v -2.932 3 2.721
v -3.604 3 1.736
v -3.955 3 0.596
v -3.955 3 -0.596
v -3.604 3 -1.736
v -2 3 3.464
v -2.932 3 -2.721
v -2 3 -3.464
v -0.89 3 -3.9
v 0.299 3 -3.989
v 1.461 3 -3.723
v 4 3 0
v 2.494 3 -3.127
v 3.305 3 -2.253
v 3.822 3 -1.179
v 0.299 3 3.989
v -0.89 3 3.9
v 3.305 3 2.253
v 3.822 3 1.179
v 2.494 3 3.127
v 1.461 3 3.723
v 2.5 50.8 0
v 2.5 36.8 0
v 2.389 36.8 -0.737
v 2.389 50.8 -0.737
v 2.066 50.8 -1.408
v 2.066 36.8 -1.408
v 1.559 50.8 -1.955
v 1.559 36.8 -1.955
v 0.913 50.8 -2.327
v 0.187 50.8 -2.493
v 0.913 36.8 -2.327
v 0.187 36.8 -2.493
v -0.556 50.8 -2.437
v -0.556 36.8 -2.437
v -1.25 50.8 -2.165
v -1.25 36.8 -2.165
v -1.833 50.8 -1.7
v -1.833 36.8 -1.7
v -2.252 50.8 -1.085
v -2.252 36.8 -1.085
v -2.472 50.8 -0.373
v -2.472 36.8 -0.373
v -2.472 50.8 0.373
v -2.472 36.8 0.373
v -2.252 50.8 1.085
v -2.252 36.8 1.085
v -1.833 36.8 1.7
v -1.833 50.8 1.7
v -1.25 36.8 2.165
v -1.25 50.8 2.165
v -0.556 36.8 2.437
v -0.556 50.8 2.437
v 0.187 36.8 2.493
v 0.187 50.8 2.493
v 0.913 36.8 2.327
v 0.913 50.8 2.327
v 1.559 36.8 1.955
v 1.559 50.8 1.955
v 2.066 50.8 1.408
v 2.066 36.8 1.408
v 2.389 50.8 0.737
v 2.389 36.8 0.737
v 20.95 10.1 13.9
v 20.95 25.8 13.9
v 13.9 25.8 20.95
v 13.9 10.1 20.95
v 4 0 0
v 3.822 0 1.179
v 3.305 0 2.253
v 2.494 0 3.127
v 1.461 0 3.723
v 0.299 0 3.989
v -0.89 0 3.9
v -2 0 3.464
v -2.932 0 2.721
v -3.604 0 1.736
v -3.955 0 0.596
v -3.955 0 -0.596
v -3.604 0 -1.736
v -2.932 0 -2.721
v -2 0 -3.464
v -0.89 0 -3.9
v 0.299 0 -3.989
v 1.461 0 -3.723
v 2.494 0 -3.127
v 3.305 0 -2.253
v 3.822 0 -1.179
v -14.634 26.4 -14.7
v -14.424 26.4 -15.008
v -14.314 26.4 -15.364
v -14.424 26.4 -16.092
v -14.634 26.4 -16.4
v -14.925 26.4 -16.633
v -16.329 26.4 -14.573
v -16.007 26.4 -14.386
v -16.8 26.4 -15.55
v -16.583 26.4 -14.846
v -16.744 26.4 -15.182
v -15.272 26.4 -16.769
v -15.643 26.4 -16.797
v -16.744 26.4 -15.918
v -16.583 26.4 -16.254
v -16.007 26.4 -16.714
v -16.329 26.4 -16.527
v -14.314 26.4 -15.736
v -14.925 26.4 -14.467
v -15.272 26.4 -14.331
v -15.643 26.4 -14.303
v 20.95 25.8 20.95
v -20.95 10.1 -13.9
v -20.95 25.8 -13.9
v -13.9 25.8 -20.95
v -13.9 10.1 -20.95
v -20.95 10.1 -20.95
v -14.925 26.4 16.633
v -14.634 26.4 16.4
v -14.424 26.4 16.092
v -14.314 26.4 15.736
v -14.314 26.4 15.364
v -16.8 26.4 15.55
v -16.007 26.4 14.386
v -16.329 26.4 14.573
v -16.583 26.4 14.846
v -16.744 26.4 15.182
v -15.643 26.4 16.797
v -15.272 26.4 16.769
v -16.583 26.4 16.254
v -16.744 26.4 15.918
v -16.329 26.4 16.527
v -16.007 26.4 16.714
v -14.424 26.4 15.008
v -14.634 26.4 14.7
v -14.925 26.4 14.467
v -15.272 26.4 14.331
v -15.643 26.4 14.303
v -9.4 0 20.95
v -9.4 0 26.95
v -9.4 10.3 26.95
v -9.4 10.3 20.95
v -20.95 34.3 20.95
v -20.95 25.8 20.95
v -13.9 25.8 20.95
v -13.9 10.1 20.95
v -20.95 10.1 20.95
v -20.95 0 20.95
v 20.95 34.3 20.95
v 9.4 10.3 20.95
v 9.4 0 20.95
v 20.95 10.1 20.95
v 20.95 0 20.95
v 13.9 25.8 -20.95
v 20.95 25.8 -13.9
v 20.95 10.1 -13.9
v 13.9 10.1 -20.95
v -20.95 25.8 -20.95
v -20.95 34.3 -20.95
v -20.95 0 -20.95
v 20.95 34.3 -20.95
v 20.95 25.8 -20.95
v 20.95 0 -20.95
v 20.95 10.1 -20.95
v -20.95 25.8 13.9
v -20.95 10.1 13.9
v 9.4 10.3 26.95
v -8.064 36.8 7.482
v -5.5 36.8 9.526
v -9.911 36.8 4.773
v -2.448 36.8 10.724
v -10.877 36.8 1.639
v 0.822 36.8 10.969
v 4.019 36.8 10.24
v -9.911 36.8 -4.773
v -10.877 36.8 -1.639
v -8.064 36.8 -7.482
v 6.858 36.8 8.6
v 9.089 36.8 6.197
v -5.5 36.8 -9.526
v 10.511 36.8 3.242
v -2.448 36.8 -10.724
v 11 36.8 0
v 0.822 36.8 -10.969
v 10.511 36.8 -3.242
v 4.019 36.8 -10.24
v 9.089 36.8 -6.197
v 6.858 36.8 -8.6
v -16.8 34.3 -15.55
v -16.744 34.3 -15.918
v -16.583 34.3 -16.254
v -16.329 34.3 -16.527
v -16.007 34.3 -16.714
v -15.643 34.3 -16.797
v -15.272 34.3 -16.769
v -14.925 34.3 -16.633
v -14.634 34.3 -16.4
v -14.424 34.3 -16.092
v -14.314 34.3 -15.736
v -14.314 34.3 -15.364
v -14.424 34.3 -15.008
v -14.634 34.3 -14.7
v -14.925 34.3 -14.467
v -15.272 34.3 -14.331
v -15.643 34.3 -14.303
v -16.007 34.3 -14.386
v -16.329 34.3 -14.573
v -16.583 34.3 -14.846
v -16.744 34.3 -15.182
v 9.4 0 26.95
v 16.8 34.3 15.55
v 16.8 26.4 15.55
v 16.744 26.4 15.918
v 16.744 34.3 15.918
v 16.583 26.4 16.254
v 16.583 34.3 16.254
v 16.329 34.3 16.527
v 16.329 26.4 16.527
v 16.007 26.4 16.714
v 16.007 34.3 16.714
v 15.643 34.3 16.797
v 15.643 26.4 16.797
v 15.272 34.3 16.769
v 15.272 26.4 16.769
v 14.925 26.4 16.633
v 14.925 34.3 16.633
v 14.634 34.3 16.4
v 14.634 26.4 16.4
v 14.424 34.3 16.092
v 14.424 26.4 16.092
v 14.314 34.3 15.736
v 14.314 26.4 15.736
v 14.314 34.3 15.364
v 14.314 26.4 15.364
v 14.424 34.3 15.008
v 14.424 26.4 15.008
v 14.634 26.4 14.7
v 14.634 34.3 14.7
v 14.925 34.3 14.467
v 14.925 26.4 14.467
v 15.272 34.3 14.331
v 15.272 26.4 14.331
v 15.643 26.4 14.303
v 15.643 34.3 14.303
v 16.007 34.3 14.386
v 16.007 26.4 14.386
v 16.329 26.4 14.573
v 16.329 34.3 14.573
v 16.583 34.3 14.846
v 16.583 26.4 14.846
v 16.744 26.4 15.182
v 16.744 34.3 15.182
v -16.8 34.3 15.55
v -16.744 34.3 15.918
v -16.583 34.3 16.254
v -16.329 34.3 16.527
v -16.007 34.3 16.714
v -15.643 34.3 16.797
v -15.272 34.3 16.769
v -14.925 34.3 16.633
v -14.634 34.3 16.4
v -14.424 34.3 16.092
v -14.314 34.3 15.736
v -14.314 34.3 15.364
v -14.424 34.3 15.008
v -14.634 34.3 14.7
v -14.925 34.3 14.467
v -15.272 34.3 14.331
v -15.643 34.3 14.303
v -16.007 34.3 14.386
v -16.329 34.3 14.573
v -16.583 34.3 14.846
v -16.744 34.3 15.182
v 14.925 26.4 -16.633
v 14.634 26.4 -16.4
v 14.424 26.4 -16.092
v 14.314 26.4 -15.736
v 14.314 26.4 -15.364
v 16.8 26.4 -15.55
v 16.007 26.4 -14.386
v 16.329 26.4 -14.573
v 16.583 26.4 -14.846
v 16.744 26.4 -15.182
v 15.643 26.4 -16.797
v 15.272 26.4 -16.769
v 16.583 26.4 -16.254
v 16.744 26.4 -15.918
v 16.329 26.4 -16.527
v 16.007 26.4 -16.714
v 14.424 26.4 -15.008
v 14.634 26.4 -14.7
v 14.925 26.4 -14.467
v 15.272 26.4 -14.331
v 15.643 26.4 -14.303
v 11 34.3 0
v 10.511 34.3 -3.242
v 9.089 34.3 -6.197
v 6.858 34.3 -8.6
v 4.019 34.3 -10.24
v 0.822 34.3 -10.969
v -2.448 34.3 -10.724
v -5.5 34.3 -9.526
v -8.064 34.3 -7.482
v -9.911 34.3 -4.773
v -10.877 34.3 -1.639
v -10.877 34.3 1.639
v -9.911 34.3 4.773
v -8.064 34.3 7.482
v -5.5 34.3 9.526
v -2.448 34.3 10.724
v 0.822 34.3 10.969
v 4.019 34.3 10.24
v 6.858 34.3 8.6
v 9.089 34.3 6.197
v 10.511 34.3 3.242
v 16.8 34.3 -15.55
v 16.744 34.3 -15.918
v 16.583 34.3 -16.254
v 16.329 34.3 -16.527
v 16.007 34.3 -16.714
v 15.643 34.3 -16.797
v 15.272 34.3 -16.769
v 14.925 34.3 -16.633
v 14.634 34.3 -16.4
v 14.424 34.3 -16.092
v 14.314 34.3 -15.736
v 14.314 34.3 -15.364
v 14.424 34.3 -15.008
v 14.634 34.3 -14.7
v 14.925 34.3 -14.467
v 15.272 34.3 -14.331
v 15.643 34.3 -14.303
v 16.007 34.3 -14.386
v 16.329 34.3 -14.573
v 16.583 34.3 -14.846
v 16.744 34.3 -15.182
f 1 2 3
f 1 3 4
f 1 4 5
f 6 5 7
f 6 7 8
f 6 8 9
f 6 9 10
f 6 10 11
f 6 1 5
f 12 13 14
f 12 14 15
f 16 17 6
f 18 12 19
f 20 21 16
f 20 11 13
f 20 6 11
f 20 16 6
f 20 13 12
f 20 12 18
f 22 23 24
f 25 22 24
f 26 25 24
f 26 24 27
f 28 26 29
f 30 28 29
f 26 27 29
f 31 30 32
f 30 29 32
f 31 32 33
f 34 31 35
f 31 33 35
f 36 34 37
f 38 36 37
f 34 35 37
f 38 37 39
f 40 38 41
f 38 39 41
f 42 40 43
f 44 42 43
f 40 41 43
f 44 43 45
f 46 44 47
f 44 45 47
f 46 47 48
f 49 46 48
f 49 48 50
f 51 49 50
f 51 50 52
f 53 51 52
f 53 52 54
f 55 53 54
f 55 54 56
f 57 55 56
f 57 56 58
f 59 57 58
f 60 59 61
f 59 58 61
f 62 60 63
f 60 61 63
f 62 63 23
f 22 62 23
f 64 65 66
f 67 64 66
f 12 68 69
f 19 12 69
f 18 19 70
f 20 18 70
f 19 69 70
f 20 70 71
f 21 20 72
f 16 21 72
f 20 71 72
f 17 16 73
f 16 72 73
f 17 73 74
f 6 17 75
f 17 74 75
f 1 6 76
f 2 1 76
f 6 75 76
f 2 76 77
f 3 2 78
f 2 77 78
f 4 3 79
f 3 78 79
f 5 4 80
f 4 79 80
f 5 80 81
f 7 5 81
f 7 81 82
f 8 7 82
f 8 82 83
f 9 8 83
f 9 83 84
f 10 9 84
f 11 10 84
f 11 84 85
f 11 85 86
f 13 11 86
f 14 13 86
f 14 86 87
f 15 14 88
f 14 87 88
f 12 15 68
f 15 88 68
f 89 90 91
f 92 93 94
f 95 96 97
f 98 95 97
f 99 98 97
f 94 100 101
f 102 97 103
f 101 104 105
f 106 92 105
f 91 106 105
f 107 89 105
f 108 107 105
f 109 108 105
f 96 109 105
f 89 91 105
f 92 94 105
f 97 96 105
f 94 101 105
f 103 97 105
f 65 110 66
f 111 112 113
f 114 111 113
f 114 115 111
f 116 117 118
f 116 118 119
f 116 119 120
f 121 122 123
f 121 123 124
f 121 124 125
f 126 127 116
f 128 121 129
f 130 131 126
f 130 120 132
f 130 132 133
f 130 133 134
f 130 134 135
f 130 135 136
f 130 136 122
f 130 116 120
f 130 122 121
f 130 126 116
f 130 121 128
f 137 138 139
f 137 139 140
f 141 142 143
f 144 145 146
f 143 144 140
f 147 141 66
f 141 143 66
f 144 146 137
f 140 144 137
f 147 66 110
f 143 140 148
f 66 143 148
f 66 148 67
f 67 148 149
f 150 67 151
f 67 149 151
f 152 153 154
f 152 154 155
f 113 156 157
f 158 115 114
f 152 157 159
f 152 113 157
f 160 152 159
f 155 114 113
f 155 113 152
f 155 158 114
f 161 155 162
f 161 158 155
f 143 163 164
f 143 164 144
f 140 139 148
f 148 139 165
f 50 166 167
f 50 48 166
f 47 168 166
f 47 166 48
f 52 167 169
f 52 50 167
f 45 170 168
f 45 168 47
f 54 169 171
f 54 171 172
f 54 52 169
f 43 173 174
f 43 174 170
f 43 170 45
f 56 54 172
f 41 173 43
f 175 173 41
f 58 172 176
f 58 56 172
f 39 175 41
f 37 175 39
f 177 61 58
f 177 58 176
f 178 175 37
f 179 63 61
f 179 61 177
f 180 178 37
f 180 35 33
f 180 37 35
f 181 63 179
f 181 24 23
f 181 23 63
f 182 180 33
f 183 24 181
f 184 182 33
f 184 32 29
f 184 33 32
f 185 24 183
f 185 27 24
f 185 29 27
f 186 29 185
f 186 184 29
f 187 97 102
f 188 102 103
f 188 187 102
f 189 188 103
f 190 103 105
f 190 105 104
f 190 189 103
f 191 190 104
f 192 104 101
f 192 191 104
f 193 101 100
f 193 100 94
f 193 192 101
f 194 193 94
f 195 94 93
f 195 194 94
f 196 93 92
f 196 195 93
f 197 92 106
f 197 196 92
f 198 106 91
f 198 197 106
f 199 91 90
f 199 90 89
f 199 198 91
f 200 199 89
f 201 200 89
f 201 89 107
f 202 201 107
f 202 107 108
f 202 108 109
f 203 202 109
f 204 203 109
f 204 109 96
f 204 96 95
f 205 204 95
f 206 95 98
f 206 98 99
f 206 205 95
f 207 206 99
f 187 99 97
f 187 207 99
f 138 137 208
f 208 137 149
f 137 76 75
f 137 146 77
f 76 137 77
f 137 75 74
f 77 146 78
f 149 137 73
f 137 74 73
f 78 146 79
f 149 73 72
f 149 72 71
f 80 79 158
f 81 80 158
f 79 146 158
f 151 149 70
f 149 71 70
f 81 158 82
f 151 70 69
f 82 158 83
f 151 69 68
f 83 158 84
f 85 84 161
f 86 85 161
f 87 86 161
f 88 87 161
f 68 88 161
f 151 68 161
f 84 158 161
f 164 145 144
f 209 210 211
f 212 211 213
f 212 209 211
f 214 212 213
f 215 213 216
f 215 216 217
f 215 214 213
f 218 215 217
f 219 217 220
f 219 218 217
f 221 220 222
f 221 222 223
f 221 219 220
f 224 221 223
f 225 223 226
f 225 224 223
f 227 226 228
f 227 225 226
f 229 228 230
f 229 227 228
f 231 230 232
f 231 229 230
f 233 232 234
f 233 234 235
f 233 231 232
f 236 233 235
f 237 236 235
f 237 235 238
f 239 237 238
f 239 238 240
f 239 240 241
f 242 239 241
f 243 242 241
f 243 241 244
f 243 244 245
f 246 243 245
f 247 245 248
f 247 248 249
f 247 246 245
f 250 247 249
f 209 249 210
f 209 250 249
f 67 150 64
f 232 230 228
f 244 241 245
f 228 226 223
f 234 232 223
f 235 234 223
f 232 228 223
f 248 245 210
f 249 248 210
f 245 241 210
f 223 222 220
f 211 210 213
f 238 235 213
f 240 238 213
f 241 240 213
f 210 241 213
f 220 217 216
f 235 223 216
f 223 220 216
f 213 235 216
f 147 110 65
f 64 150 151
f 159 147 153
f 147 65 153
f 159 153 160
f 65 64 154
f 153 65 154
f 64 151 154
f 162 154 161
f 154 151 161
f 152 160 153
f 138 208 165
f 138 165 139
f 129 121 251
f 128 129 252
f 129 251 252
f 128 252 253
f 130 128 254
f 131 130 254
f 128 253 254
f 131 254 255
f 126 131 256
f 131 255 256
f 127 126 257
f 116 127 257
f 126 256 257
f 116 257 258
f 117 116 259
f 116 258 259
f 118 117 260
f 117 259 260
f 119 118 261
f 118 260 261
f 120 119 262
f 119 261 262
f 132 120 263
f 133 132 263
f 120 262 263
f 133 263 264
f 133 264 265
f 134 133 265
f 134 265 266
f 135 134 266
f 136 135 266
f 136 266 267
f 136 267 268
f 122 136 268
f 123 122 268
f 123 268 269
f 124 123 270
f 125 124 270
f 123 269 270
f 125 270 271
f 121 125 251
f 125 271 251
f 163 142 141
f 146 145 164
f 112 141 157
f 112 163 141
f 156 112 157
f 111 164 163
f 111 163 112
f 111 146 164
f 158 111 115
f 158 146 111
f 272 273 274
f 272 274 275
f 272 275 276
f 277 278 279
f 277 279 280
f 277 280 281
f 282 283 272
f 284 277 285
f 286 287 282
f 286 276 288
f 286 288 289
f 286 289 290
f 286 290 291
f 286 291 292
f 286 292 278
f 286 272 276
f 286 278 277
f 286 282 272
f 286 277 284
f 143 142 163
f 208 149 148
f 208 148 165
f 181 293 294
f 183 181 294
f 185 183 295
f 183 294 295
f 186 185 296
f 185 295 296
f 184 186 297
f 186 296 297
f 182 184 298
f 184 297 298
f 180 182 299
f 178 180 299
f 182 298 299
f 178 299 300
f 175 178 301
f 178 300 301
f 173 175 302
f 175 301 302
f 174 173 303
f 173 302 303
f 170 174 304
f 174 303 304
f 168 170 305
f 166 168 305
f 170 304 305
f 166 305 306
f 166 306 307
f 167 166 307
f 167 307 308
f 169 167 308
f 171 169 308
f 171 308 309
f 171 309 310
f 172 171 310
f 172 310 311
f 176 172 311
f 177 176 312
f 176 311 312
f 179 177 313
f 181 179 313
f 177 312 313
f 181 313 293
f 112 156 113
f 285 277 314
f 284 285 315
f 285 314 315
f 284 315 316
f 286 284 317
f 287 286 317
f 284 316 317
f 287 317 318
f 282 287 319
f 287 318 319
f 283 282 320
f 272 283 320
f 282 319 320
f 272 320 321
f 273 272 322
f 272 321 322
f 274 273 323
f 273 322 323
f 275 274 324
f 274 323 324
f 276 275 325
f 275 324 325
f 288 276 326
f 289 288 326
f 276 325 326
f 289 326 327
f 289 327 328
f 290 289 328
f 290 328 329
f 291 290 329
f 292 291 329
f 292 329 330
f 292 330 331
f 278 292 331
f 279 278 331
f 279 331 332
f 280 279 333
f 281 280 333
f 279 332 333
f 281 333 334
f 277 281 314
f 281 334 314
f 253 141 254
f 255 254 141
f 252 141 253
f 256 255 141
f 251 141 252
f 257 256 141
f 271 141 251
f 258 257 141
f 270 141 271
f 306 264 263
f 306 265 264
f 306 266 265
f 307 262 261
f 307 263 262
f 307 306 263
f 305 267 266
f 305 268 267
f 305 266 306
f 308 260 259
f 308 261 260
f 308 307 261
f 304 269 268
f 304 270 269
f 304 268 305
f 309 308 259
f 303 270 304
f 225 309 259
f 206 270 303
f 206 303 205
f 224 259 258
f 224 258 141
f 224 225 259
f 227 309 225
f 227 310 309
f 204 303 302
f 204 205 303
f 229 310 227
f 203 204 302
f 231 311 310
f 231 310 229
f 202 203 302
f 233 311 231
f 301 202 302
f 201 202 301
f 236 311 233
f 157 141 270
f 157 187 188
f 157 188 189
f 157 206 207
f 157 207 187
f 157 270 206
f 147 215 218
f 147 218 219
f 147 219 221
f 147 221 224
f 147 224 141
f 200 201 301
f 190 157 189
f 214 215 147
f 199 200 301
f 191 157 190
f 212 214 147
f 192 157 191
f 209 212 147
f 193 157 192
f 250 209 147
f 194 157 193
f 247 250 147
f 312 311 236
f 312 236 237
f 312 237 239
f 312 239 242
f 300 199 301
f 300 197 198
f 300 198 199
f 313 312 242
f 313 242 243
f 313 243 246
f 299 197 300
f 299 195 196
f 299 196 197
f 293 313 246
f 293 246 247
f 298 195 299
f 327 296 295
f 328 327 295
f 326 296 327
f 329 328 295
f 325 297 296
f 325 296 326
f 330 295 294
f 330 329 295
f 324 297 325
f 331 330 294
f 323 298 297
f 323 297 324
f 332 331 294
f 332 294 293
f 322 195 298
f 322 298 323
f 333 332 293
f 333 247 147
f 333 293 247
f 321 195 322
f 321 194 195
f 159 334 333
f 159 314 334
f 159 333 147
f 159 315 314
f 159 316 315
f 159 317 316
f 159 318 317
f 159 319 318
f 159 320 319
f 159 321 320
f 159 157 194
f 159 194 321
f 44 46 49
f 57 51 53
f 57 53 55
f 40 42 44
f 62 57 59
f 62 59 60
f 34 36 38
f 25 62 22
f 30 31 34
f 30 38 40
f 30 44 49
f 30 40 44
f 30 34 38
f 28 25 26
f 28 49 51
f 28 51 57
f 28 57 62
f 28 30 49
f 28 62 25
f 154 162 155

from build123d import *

# Parameters (mm, degrees)
SKETCH1_W               = 41.9
SKETCH1_H               = 41.9
BOSS_EXTRUDE1_DEPTH     = 34.3
SKETCH2_R               = 11
BOSS_EXTRUDE2_DEPTH     = 2.5
SKETCH3_R               = 2.5
BOSS_EXTRUDE3_DEPTH     = 14
SKETCH4_R               = 1.25
CUT_EXTRUDE1_DEPTH      = 7.9
MIRROR2_COPY_1_SKETCH_R = 1.25
MIRROR2_COPY_1_DEPTH    = 7.9
CUT_EXTRUDE2_DEPTH      = 15.7
MIRROR4_COPY_1_DEPTH    = 15.7
BOSS_EXTRUDE4_DEPTH     = 10.3
SKETCH12_R              = 4
CUT_EXTRUDE3_DEPTH      = 3


with BuildPart() as part:
    # Sketch1 → Boss-Extrude1 (new body)
    with BuildSketch(Plane(origin=(0, 0, 0), x_dir=(1, 0, 0), z_dir=(0, 1, 0))):
        Rectangle(SKETCH1_W, SKETCH1_H)
    extrude(amount=BOSS_EXTRUDE1_DEPTH)

    # Sketch2 → Boss-Extrude2 (add)
    with BuildSketch(Plane(origin=(0, 34.3, 0), x_dir=(1, 0, 0), z_dir=(0, 1, 0))):
        Circle(SKETCH2_R)
    extrude(amount=BOSS_EXTRUDE2_DEPTH)

    # Sketch3 → Boss-Extrude3 (add)
    with BuildSketch(Plane(origin=(0, 36.8, 0), x_dir=(1, 0, 0), z_dir=(0, 1, 0))):
        Circle(SKETCH3_R)
    extrude(amount=BOSS_EXTRUDE3_DEPTH)

    # Sketch4 → Cut-Extrude1 (cut)
    with BuildSketch(Plane(origin=(0, 34.3, 0), x_dir=(1, 0, 0), z_dir=(0, 1, 0))):
        with Locations((15.55, 15.55)):
            Circle(SKETCH4_R)
    cut_extrude1 = extrude(amount=-CUT_EXTRUDE1_DEPTH, mode=Mode.SUBTRACT)

    # Mirror1: Cut-Extrude1 across plane
    add(cut_extrude1.mirror(Plane(origin=(0, 0, 0), x_dir=(0, 0, 1), z_dir=(1, 0, 0))), mode=Mode.SUBTRACT)

    # Mirror2: Cut-Extrude1 across plane
    add(cut_extrude1.mirror(Plane.XY), mode=Mode.SUBTRACT)

    # Mirror2 copy 1 sketch → Mirror2 copy 1 (cut)
    with BuildSketch(Plane(origin=(0, 34.3, 0), x_dir=(-1, 0, 0), z_dir=(0, 1, 0))):
        with Locations((15.55, 15.55)):
            Circle(MIRROR2_COPY_1_SKETCH_R)
    extrude(amount=-MIRROR2_COPY_1_DEPTH, mode=Mode.SUBTRACT)

    # Sketch10 → Cut-Extrude2 (cut)
    with BuildSketch(Plane(origin=(0, 25.8, 0), x_dir=(-1, 0, 0), z_dir=(0, -1, 0))):
        Polygon((-20.95, 13.9), (-13.9, 20.95), (-20.95, 20.95), align=None)
    cut_extrude2 = extrude(amount=CUT_EXTRUDE2_DEPTH, mode=Mode.SUBTRACT)

    # Mirror3: Cut-Extrude2 across plane
    add(cut_extrude2.mirror(Plane(origin=(0, 0, 0), x_dir=(0, 0, 1), z_dir=(1, 0, 0))), mode=Mode.SUBTRACT)

    # Mirror4: Cut-Extrude2 across plane
    add(cut_extrude2.mirror(Plane.XY), mode=Mode.SUBTRACT)

    # Mirror4 copy 1 sketch → Mirror4 copy 1 (cut)
    with BuildSketch(Plane.XZ.offset(-25.8)):
        Polygon((-20.95, 13.9), (-13.9, 20.95), (-20.95, 20.95), align=None)
    extrude(amount=MIRROR4_COPY_1_DEPTH, mode=Mode.SUBTRACT)

    # Sketch11 → Boss-Extrude4 (add)
    with BuildSketch(Plane.XZ):
        Polygon((0, 20.95), (9.4, 20.95), (9.4, 26.95), (-9.4, 26.95), (-9.4, 20.95), align=None)
    extrude(amount=-BOSS_EXTRUDE4_DEPTH)

    # Sketch12 → Cut-Extrude3 (cut)
    with BuildSketch(Plane.XZ):
        Circle(SKETCH12_R)
    extrude(amount=-CUT_EXTRUDE3_DEPTH, mode=Mode.SUBTRACT)


solid = part.part
